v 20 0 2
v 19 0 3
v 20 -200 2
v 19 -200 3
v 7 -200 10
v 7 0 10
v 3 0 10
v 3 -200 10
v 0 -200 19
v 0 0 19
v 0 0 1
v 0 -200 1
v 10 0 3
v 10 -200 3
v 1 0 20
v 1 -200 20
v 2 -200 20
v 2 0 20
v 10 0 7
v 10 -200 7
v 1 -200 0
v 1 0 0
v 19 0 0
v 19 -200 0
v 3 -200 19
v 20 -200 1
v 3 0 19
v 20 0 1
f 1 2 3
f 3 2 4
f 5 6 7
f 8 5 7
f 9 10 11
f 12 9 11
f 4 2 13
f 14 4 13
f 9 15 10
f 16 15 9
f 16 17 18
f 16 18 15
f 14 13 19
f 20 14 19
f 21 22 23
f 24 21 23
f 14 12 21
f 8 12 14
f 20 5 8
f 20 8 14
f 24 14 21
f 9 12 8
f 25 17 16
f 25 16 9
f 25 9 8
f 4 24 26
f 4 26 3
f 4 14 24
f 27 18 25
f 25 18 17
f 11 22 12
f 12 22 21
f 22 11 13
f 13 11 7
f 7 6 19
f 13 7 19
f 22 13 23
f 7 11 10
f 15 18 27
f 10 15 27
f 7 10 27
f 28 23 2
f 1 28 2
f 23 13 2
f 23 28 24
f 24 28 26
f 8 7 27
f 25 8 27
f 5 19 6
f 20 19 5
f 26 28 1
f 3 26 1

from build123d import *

# Parameters (mm, degrees)
F1_DEPTH = 200
F2_SIZE  = 1
F3_SIZE  = 3


with BuildPart() as f1:
    # F0 (on Front) → F1 (new body)
    with BuildSketch(Plane.XZ):
        Polygon((0, 20), (0, 0), (20, 0), (20, 3), (10, 3), (10, 10), (3, 10), (3, 20), align=None)
    extrude(amount=F1_DEPTH)

    # F2
    f2_edges = [f1.edges().sort_by_distance(p)[0] for p in [
        (0, -100, 20),
        (3, -100, 20),
        (20, -100, 3),
        (20, -100, 0),
        (0, -100, 0),
    ]]
    chamfer(f2_edges, length=F2_SIZE)

    # F3
    f3_edges = [f1.edges().sort_by_distance(p)[0] for p in [
        (10, -100, 10),
    ]]
    chamfer(f3_edges, length=F3_SIZE)


solid = f1.part
